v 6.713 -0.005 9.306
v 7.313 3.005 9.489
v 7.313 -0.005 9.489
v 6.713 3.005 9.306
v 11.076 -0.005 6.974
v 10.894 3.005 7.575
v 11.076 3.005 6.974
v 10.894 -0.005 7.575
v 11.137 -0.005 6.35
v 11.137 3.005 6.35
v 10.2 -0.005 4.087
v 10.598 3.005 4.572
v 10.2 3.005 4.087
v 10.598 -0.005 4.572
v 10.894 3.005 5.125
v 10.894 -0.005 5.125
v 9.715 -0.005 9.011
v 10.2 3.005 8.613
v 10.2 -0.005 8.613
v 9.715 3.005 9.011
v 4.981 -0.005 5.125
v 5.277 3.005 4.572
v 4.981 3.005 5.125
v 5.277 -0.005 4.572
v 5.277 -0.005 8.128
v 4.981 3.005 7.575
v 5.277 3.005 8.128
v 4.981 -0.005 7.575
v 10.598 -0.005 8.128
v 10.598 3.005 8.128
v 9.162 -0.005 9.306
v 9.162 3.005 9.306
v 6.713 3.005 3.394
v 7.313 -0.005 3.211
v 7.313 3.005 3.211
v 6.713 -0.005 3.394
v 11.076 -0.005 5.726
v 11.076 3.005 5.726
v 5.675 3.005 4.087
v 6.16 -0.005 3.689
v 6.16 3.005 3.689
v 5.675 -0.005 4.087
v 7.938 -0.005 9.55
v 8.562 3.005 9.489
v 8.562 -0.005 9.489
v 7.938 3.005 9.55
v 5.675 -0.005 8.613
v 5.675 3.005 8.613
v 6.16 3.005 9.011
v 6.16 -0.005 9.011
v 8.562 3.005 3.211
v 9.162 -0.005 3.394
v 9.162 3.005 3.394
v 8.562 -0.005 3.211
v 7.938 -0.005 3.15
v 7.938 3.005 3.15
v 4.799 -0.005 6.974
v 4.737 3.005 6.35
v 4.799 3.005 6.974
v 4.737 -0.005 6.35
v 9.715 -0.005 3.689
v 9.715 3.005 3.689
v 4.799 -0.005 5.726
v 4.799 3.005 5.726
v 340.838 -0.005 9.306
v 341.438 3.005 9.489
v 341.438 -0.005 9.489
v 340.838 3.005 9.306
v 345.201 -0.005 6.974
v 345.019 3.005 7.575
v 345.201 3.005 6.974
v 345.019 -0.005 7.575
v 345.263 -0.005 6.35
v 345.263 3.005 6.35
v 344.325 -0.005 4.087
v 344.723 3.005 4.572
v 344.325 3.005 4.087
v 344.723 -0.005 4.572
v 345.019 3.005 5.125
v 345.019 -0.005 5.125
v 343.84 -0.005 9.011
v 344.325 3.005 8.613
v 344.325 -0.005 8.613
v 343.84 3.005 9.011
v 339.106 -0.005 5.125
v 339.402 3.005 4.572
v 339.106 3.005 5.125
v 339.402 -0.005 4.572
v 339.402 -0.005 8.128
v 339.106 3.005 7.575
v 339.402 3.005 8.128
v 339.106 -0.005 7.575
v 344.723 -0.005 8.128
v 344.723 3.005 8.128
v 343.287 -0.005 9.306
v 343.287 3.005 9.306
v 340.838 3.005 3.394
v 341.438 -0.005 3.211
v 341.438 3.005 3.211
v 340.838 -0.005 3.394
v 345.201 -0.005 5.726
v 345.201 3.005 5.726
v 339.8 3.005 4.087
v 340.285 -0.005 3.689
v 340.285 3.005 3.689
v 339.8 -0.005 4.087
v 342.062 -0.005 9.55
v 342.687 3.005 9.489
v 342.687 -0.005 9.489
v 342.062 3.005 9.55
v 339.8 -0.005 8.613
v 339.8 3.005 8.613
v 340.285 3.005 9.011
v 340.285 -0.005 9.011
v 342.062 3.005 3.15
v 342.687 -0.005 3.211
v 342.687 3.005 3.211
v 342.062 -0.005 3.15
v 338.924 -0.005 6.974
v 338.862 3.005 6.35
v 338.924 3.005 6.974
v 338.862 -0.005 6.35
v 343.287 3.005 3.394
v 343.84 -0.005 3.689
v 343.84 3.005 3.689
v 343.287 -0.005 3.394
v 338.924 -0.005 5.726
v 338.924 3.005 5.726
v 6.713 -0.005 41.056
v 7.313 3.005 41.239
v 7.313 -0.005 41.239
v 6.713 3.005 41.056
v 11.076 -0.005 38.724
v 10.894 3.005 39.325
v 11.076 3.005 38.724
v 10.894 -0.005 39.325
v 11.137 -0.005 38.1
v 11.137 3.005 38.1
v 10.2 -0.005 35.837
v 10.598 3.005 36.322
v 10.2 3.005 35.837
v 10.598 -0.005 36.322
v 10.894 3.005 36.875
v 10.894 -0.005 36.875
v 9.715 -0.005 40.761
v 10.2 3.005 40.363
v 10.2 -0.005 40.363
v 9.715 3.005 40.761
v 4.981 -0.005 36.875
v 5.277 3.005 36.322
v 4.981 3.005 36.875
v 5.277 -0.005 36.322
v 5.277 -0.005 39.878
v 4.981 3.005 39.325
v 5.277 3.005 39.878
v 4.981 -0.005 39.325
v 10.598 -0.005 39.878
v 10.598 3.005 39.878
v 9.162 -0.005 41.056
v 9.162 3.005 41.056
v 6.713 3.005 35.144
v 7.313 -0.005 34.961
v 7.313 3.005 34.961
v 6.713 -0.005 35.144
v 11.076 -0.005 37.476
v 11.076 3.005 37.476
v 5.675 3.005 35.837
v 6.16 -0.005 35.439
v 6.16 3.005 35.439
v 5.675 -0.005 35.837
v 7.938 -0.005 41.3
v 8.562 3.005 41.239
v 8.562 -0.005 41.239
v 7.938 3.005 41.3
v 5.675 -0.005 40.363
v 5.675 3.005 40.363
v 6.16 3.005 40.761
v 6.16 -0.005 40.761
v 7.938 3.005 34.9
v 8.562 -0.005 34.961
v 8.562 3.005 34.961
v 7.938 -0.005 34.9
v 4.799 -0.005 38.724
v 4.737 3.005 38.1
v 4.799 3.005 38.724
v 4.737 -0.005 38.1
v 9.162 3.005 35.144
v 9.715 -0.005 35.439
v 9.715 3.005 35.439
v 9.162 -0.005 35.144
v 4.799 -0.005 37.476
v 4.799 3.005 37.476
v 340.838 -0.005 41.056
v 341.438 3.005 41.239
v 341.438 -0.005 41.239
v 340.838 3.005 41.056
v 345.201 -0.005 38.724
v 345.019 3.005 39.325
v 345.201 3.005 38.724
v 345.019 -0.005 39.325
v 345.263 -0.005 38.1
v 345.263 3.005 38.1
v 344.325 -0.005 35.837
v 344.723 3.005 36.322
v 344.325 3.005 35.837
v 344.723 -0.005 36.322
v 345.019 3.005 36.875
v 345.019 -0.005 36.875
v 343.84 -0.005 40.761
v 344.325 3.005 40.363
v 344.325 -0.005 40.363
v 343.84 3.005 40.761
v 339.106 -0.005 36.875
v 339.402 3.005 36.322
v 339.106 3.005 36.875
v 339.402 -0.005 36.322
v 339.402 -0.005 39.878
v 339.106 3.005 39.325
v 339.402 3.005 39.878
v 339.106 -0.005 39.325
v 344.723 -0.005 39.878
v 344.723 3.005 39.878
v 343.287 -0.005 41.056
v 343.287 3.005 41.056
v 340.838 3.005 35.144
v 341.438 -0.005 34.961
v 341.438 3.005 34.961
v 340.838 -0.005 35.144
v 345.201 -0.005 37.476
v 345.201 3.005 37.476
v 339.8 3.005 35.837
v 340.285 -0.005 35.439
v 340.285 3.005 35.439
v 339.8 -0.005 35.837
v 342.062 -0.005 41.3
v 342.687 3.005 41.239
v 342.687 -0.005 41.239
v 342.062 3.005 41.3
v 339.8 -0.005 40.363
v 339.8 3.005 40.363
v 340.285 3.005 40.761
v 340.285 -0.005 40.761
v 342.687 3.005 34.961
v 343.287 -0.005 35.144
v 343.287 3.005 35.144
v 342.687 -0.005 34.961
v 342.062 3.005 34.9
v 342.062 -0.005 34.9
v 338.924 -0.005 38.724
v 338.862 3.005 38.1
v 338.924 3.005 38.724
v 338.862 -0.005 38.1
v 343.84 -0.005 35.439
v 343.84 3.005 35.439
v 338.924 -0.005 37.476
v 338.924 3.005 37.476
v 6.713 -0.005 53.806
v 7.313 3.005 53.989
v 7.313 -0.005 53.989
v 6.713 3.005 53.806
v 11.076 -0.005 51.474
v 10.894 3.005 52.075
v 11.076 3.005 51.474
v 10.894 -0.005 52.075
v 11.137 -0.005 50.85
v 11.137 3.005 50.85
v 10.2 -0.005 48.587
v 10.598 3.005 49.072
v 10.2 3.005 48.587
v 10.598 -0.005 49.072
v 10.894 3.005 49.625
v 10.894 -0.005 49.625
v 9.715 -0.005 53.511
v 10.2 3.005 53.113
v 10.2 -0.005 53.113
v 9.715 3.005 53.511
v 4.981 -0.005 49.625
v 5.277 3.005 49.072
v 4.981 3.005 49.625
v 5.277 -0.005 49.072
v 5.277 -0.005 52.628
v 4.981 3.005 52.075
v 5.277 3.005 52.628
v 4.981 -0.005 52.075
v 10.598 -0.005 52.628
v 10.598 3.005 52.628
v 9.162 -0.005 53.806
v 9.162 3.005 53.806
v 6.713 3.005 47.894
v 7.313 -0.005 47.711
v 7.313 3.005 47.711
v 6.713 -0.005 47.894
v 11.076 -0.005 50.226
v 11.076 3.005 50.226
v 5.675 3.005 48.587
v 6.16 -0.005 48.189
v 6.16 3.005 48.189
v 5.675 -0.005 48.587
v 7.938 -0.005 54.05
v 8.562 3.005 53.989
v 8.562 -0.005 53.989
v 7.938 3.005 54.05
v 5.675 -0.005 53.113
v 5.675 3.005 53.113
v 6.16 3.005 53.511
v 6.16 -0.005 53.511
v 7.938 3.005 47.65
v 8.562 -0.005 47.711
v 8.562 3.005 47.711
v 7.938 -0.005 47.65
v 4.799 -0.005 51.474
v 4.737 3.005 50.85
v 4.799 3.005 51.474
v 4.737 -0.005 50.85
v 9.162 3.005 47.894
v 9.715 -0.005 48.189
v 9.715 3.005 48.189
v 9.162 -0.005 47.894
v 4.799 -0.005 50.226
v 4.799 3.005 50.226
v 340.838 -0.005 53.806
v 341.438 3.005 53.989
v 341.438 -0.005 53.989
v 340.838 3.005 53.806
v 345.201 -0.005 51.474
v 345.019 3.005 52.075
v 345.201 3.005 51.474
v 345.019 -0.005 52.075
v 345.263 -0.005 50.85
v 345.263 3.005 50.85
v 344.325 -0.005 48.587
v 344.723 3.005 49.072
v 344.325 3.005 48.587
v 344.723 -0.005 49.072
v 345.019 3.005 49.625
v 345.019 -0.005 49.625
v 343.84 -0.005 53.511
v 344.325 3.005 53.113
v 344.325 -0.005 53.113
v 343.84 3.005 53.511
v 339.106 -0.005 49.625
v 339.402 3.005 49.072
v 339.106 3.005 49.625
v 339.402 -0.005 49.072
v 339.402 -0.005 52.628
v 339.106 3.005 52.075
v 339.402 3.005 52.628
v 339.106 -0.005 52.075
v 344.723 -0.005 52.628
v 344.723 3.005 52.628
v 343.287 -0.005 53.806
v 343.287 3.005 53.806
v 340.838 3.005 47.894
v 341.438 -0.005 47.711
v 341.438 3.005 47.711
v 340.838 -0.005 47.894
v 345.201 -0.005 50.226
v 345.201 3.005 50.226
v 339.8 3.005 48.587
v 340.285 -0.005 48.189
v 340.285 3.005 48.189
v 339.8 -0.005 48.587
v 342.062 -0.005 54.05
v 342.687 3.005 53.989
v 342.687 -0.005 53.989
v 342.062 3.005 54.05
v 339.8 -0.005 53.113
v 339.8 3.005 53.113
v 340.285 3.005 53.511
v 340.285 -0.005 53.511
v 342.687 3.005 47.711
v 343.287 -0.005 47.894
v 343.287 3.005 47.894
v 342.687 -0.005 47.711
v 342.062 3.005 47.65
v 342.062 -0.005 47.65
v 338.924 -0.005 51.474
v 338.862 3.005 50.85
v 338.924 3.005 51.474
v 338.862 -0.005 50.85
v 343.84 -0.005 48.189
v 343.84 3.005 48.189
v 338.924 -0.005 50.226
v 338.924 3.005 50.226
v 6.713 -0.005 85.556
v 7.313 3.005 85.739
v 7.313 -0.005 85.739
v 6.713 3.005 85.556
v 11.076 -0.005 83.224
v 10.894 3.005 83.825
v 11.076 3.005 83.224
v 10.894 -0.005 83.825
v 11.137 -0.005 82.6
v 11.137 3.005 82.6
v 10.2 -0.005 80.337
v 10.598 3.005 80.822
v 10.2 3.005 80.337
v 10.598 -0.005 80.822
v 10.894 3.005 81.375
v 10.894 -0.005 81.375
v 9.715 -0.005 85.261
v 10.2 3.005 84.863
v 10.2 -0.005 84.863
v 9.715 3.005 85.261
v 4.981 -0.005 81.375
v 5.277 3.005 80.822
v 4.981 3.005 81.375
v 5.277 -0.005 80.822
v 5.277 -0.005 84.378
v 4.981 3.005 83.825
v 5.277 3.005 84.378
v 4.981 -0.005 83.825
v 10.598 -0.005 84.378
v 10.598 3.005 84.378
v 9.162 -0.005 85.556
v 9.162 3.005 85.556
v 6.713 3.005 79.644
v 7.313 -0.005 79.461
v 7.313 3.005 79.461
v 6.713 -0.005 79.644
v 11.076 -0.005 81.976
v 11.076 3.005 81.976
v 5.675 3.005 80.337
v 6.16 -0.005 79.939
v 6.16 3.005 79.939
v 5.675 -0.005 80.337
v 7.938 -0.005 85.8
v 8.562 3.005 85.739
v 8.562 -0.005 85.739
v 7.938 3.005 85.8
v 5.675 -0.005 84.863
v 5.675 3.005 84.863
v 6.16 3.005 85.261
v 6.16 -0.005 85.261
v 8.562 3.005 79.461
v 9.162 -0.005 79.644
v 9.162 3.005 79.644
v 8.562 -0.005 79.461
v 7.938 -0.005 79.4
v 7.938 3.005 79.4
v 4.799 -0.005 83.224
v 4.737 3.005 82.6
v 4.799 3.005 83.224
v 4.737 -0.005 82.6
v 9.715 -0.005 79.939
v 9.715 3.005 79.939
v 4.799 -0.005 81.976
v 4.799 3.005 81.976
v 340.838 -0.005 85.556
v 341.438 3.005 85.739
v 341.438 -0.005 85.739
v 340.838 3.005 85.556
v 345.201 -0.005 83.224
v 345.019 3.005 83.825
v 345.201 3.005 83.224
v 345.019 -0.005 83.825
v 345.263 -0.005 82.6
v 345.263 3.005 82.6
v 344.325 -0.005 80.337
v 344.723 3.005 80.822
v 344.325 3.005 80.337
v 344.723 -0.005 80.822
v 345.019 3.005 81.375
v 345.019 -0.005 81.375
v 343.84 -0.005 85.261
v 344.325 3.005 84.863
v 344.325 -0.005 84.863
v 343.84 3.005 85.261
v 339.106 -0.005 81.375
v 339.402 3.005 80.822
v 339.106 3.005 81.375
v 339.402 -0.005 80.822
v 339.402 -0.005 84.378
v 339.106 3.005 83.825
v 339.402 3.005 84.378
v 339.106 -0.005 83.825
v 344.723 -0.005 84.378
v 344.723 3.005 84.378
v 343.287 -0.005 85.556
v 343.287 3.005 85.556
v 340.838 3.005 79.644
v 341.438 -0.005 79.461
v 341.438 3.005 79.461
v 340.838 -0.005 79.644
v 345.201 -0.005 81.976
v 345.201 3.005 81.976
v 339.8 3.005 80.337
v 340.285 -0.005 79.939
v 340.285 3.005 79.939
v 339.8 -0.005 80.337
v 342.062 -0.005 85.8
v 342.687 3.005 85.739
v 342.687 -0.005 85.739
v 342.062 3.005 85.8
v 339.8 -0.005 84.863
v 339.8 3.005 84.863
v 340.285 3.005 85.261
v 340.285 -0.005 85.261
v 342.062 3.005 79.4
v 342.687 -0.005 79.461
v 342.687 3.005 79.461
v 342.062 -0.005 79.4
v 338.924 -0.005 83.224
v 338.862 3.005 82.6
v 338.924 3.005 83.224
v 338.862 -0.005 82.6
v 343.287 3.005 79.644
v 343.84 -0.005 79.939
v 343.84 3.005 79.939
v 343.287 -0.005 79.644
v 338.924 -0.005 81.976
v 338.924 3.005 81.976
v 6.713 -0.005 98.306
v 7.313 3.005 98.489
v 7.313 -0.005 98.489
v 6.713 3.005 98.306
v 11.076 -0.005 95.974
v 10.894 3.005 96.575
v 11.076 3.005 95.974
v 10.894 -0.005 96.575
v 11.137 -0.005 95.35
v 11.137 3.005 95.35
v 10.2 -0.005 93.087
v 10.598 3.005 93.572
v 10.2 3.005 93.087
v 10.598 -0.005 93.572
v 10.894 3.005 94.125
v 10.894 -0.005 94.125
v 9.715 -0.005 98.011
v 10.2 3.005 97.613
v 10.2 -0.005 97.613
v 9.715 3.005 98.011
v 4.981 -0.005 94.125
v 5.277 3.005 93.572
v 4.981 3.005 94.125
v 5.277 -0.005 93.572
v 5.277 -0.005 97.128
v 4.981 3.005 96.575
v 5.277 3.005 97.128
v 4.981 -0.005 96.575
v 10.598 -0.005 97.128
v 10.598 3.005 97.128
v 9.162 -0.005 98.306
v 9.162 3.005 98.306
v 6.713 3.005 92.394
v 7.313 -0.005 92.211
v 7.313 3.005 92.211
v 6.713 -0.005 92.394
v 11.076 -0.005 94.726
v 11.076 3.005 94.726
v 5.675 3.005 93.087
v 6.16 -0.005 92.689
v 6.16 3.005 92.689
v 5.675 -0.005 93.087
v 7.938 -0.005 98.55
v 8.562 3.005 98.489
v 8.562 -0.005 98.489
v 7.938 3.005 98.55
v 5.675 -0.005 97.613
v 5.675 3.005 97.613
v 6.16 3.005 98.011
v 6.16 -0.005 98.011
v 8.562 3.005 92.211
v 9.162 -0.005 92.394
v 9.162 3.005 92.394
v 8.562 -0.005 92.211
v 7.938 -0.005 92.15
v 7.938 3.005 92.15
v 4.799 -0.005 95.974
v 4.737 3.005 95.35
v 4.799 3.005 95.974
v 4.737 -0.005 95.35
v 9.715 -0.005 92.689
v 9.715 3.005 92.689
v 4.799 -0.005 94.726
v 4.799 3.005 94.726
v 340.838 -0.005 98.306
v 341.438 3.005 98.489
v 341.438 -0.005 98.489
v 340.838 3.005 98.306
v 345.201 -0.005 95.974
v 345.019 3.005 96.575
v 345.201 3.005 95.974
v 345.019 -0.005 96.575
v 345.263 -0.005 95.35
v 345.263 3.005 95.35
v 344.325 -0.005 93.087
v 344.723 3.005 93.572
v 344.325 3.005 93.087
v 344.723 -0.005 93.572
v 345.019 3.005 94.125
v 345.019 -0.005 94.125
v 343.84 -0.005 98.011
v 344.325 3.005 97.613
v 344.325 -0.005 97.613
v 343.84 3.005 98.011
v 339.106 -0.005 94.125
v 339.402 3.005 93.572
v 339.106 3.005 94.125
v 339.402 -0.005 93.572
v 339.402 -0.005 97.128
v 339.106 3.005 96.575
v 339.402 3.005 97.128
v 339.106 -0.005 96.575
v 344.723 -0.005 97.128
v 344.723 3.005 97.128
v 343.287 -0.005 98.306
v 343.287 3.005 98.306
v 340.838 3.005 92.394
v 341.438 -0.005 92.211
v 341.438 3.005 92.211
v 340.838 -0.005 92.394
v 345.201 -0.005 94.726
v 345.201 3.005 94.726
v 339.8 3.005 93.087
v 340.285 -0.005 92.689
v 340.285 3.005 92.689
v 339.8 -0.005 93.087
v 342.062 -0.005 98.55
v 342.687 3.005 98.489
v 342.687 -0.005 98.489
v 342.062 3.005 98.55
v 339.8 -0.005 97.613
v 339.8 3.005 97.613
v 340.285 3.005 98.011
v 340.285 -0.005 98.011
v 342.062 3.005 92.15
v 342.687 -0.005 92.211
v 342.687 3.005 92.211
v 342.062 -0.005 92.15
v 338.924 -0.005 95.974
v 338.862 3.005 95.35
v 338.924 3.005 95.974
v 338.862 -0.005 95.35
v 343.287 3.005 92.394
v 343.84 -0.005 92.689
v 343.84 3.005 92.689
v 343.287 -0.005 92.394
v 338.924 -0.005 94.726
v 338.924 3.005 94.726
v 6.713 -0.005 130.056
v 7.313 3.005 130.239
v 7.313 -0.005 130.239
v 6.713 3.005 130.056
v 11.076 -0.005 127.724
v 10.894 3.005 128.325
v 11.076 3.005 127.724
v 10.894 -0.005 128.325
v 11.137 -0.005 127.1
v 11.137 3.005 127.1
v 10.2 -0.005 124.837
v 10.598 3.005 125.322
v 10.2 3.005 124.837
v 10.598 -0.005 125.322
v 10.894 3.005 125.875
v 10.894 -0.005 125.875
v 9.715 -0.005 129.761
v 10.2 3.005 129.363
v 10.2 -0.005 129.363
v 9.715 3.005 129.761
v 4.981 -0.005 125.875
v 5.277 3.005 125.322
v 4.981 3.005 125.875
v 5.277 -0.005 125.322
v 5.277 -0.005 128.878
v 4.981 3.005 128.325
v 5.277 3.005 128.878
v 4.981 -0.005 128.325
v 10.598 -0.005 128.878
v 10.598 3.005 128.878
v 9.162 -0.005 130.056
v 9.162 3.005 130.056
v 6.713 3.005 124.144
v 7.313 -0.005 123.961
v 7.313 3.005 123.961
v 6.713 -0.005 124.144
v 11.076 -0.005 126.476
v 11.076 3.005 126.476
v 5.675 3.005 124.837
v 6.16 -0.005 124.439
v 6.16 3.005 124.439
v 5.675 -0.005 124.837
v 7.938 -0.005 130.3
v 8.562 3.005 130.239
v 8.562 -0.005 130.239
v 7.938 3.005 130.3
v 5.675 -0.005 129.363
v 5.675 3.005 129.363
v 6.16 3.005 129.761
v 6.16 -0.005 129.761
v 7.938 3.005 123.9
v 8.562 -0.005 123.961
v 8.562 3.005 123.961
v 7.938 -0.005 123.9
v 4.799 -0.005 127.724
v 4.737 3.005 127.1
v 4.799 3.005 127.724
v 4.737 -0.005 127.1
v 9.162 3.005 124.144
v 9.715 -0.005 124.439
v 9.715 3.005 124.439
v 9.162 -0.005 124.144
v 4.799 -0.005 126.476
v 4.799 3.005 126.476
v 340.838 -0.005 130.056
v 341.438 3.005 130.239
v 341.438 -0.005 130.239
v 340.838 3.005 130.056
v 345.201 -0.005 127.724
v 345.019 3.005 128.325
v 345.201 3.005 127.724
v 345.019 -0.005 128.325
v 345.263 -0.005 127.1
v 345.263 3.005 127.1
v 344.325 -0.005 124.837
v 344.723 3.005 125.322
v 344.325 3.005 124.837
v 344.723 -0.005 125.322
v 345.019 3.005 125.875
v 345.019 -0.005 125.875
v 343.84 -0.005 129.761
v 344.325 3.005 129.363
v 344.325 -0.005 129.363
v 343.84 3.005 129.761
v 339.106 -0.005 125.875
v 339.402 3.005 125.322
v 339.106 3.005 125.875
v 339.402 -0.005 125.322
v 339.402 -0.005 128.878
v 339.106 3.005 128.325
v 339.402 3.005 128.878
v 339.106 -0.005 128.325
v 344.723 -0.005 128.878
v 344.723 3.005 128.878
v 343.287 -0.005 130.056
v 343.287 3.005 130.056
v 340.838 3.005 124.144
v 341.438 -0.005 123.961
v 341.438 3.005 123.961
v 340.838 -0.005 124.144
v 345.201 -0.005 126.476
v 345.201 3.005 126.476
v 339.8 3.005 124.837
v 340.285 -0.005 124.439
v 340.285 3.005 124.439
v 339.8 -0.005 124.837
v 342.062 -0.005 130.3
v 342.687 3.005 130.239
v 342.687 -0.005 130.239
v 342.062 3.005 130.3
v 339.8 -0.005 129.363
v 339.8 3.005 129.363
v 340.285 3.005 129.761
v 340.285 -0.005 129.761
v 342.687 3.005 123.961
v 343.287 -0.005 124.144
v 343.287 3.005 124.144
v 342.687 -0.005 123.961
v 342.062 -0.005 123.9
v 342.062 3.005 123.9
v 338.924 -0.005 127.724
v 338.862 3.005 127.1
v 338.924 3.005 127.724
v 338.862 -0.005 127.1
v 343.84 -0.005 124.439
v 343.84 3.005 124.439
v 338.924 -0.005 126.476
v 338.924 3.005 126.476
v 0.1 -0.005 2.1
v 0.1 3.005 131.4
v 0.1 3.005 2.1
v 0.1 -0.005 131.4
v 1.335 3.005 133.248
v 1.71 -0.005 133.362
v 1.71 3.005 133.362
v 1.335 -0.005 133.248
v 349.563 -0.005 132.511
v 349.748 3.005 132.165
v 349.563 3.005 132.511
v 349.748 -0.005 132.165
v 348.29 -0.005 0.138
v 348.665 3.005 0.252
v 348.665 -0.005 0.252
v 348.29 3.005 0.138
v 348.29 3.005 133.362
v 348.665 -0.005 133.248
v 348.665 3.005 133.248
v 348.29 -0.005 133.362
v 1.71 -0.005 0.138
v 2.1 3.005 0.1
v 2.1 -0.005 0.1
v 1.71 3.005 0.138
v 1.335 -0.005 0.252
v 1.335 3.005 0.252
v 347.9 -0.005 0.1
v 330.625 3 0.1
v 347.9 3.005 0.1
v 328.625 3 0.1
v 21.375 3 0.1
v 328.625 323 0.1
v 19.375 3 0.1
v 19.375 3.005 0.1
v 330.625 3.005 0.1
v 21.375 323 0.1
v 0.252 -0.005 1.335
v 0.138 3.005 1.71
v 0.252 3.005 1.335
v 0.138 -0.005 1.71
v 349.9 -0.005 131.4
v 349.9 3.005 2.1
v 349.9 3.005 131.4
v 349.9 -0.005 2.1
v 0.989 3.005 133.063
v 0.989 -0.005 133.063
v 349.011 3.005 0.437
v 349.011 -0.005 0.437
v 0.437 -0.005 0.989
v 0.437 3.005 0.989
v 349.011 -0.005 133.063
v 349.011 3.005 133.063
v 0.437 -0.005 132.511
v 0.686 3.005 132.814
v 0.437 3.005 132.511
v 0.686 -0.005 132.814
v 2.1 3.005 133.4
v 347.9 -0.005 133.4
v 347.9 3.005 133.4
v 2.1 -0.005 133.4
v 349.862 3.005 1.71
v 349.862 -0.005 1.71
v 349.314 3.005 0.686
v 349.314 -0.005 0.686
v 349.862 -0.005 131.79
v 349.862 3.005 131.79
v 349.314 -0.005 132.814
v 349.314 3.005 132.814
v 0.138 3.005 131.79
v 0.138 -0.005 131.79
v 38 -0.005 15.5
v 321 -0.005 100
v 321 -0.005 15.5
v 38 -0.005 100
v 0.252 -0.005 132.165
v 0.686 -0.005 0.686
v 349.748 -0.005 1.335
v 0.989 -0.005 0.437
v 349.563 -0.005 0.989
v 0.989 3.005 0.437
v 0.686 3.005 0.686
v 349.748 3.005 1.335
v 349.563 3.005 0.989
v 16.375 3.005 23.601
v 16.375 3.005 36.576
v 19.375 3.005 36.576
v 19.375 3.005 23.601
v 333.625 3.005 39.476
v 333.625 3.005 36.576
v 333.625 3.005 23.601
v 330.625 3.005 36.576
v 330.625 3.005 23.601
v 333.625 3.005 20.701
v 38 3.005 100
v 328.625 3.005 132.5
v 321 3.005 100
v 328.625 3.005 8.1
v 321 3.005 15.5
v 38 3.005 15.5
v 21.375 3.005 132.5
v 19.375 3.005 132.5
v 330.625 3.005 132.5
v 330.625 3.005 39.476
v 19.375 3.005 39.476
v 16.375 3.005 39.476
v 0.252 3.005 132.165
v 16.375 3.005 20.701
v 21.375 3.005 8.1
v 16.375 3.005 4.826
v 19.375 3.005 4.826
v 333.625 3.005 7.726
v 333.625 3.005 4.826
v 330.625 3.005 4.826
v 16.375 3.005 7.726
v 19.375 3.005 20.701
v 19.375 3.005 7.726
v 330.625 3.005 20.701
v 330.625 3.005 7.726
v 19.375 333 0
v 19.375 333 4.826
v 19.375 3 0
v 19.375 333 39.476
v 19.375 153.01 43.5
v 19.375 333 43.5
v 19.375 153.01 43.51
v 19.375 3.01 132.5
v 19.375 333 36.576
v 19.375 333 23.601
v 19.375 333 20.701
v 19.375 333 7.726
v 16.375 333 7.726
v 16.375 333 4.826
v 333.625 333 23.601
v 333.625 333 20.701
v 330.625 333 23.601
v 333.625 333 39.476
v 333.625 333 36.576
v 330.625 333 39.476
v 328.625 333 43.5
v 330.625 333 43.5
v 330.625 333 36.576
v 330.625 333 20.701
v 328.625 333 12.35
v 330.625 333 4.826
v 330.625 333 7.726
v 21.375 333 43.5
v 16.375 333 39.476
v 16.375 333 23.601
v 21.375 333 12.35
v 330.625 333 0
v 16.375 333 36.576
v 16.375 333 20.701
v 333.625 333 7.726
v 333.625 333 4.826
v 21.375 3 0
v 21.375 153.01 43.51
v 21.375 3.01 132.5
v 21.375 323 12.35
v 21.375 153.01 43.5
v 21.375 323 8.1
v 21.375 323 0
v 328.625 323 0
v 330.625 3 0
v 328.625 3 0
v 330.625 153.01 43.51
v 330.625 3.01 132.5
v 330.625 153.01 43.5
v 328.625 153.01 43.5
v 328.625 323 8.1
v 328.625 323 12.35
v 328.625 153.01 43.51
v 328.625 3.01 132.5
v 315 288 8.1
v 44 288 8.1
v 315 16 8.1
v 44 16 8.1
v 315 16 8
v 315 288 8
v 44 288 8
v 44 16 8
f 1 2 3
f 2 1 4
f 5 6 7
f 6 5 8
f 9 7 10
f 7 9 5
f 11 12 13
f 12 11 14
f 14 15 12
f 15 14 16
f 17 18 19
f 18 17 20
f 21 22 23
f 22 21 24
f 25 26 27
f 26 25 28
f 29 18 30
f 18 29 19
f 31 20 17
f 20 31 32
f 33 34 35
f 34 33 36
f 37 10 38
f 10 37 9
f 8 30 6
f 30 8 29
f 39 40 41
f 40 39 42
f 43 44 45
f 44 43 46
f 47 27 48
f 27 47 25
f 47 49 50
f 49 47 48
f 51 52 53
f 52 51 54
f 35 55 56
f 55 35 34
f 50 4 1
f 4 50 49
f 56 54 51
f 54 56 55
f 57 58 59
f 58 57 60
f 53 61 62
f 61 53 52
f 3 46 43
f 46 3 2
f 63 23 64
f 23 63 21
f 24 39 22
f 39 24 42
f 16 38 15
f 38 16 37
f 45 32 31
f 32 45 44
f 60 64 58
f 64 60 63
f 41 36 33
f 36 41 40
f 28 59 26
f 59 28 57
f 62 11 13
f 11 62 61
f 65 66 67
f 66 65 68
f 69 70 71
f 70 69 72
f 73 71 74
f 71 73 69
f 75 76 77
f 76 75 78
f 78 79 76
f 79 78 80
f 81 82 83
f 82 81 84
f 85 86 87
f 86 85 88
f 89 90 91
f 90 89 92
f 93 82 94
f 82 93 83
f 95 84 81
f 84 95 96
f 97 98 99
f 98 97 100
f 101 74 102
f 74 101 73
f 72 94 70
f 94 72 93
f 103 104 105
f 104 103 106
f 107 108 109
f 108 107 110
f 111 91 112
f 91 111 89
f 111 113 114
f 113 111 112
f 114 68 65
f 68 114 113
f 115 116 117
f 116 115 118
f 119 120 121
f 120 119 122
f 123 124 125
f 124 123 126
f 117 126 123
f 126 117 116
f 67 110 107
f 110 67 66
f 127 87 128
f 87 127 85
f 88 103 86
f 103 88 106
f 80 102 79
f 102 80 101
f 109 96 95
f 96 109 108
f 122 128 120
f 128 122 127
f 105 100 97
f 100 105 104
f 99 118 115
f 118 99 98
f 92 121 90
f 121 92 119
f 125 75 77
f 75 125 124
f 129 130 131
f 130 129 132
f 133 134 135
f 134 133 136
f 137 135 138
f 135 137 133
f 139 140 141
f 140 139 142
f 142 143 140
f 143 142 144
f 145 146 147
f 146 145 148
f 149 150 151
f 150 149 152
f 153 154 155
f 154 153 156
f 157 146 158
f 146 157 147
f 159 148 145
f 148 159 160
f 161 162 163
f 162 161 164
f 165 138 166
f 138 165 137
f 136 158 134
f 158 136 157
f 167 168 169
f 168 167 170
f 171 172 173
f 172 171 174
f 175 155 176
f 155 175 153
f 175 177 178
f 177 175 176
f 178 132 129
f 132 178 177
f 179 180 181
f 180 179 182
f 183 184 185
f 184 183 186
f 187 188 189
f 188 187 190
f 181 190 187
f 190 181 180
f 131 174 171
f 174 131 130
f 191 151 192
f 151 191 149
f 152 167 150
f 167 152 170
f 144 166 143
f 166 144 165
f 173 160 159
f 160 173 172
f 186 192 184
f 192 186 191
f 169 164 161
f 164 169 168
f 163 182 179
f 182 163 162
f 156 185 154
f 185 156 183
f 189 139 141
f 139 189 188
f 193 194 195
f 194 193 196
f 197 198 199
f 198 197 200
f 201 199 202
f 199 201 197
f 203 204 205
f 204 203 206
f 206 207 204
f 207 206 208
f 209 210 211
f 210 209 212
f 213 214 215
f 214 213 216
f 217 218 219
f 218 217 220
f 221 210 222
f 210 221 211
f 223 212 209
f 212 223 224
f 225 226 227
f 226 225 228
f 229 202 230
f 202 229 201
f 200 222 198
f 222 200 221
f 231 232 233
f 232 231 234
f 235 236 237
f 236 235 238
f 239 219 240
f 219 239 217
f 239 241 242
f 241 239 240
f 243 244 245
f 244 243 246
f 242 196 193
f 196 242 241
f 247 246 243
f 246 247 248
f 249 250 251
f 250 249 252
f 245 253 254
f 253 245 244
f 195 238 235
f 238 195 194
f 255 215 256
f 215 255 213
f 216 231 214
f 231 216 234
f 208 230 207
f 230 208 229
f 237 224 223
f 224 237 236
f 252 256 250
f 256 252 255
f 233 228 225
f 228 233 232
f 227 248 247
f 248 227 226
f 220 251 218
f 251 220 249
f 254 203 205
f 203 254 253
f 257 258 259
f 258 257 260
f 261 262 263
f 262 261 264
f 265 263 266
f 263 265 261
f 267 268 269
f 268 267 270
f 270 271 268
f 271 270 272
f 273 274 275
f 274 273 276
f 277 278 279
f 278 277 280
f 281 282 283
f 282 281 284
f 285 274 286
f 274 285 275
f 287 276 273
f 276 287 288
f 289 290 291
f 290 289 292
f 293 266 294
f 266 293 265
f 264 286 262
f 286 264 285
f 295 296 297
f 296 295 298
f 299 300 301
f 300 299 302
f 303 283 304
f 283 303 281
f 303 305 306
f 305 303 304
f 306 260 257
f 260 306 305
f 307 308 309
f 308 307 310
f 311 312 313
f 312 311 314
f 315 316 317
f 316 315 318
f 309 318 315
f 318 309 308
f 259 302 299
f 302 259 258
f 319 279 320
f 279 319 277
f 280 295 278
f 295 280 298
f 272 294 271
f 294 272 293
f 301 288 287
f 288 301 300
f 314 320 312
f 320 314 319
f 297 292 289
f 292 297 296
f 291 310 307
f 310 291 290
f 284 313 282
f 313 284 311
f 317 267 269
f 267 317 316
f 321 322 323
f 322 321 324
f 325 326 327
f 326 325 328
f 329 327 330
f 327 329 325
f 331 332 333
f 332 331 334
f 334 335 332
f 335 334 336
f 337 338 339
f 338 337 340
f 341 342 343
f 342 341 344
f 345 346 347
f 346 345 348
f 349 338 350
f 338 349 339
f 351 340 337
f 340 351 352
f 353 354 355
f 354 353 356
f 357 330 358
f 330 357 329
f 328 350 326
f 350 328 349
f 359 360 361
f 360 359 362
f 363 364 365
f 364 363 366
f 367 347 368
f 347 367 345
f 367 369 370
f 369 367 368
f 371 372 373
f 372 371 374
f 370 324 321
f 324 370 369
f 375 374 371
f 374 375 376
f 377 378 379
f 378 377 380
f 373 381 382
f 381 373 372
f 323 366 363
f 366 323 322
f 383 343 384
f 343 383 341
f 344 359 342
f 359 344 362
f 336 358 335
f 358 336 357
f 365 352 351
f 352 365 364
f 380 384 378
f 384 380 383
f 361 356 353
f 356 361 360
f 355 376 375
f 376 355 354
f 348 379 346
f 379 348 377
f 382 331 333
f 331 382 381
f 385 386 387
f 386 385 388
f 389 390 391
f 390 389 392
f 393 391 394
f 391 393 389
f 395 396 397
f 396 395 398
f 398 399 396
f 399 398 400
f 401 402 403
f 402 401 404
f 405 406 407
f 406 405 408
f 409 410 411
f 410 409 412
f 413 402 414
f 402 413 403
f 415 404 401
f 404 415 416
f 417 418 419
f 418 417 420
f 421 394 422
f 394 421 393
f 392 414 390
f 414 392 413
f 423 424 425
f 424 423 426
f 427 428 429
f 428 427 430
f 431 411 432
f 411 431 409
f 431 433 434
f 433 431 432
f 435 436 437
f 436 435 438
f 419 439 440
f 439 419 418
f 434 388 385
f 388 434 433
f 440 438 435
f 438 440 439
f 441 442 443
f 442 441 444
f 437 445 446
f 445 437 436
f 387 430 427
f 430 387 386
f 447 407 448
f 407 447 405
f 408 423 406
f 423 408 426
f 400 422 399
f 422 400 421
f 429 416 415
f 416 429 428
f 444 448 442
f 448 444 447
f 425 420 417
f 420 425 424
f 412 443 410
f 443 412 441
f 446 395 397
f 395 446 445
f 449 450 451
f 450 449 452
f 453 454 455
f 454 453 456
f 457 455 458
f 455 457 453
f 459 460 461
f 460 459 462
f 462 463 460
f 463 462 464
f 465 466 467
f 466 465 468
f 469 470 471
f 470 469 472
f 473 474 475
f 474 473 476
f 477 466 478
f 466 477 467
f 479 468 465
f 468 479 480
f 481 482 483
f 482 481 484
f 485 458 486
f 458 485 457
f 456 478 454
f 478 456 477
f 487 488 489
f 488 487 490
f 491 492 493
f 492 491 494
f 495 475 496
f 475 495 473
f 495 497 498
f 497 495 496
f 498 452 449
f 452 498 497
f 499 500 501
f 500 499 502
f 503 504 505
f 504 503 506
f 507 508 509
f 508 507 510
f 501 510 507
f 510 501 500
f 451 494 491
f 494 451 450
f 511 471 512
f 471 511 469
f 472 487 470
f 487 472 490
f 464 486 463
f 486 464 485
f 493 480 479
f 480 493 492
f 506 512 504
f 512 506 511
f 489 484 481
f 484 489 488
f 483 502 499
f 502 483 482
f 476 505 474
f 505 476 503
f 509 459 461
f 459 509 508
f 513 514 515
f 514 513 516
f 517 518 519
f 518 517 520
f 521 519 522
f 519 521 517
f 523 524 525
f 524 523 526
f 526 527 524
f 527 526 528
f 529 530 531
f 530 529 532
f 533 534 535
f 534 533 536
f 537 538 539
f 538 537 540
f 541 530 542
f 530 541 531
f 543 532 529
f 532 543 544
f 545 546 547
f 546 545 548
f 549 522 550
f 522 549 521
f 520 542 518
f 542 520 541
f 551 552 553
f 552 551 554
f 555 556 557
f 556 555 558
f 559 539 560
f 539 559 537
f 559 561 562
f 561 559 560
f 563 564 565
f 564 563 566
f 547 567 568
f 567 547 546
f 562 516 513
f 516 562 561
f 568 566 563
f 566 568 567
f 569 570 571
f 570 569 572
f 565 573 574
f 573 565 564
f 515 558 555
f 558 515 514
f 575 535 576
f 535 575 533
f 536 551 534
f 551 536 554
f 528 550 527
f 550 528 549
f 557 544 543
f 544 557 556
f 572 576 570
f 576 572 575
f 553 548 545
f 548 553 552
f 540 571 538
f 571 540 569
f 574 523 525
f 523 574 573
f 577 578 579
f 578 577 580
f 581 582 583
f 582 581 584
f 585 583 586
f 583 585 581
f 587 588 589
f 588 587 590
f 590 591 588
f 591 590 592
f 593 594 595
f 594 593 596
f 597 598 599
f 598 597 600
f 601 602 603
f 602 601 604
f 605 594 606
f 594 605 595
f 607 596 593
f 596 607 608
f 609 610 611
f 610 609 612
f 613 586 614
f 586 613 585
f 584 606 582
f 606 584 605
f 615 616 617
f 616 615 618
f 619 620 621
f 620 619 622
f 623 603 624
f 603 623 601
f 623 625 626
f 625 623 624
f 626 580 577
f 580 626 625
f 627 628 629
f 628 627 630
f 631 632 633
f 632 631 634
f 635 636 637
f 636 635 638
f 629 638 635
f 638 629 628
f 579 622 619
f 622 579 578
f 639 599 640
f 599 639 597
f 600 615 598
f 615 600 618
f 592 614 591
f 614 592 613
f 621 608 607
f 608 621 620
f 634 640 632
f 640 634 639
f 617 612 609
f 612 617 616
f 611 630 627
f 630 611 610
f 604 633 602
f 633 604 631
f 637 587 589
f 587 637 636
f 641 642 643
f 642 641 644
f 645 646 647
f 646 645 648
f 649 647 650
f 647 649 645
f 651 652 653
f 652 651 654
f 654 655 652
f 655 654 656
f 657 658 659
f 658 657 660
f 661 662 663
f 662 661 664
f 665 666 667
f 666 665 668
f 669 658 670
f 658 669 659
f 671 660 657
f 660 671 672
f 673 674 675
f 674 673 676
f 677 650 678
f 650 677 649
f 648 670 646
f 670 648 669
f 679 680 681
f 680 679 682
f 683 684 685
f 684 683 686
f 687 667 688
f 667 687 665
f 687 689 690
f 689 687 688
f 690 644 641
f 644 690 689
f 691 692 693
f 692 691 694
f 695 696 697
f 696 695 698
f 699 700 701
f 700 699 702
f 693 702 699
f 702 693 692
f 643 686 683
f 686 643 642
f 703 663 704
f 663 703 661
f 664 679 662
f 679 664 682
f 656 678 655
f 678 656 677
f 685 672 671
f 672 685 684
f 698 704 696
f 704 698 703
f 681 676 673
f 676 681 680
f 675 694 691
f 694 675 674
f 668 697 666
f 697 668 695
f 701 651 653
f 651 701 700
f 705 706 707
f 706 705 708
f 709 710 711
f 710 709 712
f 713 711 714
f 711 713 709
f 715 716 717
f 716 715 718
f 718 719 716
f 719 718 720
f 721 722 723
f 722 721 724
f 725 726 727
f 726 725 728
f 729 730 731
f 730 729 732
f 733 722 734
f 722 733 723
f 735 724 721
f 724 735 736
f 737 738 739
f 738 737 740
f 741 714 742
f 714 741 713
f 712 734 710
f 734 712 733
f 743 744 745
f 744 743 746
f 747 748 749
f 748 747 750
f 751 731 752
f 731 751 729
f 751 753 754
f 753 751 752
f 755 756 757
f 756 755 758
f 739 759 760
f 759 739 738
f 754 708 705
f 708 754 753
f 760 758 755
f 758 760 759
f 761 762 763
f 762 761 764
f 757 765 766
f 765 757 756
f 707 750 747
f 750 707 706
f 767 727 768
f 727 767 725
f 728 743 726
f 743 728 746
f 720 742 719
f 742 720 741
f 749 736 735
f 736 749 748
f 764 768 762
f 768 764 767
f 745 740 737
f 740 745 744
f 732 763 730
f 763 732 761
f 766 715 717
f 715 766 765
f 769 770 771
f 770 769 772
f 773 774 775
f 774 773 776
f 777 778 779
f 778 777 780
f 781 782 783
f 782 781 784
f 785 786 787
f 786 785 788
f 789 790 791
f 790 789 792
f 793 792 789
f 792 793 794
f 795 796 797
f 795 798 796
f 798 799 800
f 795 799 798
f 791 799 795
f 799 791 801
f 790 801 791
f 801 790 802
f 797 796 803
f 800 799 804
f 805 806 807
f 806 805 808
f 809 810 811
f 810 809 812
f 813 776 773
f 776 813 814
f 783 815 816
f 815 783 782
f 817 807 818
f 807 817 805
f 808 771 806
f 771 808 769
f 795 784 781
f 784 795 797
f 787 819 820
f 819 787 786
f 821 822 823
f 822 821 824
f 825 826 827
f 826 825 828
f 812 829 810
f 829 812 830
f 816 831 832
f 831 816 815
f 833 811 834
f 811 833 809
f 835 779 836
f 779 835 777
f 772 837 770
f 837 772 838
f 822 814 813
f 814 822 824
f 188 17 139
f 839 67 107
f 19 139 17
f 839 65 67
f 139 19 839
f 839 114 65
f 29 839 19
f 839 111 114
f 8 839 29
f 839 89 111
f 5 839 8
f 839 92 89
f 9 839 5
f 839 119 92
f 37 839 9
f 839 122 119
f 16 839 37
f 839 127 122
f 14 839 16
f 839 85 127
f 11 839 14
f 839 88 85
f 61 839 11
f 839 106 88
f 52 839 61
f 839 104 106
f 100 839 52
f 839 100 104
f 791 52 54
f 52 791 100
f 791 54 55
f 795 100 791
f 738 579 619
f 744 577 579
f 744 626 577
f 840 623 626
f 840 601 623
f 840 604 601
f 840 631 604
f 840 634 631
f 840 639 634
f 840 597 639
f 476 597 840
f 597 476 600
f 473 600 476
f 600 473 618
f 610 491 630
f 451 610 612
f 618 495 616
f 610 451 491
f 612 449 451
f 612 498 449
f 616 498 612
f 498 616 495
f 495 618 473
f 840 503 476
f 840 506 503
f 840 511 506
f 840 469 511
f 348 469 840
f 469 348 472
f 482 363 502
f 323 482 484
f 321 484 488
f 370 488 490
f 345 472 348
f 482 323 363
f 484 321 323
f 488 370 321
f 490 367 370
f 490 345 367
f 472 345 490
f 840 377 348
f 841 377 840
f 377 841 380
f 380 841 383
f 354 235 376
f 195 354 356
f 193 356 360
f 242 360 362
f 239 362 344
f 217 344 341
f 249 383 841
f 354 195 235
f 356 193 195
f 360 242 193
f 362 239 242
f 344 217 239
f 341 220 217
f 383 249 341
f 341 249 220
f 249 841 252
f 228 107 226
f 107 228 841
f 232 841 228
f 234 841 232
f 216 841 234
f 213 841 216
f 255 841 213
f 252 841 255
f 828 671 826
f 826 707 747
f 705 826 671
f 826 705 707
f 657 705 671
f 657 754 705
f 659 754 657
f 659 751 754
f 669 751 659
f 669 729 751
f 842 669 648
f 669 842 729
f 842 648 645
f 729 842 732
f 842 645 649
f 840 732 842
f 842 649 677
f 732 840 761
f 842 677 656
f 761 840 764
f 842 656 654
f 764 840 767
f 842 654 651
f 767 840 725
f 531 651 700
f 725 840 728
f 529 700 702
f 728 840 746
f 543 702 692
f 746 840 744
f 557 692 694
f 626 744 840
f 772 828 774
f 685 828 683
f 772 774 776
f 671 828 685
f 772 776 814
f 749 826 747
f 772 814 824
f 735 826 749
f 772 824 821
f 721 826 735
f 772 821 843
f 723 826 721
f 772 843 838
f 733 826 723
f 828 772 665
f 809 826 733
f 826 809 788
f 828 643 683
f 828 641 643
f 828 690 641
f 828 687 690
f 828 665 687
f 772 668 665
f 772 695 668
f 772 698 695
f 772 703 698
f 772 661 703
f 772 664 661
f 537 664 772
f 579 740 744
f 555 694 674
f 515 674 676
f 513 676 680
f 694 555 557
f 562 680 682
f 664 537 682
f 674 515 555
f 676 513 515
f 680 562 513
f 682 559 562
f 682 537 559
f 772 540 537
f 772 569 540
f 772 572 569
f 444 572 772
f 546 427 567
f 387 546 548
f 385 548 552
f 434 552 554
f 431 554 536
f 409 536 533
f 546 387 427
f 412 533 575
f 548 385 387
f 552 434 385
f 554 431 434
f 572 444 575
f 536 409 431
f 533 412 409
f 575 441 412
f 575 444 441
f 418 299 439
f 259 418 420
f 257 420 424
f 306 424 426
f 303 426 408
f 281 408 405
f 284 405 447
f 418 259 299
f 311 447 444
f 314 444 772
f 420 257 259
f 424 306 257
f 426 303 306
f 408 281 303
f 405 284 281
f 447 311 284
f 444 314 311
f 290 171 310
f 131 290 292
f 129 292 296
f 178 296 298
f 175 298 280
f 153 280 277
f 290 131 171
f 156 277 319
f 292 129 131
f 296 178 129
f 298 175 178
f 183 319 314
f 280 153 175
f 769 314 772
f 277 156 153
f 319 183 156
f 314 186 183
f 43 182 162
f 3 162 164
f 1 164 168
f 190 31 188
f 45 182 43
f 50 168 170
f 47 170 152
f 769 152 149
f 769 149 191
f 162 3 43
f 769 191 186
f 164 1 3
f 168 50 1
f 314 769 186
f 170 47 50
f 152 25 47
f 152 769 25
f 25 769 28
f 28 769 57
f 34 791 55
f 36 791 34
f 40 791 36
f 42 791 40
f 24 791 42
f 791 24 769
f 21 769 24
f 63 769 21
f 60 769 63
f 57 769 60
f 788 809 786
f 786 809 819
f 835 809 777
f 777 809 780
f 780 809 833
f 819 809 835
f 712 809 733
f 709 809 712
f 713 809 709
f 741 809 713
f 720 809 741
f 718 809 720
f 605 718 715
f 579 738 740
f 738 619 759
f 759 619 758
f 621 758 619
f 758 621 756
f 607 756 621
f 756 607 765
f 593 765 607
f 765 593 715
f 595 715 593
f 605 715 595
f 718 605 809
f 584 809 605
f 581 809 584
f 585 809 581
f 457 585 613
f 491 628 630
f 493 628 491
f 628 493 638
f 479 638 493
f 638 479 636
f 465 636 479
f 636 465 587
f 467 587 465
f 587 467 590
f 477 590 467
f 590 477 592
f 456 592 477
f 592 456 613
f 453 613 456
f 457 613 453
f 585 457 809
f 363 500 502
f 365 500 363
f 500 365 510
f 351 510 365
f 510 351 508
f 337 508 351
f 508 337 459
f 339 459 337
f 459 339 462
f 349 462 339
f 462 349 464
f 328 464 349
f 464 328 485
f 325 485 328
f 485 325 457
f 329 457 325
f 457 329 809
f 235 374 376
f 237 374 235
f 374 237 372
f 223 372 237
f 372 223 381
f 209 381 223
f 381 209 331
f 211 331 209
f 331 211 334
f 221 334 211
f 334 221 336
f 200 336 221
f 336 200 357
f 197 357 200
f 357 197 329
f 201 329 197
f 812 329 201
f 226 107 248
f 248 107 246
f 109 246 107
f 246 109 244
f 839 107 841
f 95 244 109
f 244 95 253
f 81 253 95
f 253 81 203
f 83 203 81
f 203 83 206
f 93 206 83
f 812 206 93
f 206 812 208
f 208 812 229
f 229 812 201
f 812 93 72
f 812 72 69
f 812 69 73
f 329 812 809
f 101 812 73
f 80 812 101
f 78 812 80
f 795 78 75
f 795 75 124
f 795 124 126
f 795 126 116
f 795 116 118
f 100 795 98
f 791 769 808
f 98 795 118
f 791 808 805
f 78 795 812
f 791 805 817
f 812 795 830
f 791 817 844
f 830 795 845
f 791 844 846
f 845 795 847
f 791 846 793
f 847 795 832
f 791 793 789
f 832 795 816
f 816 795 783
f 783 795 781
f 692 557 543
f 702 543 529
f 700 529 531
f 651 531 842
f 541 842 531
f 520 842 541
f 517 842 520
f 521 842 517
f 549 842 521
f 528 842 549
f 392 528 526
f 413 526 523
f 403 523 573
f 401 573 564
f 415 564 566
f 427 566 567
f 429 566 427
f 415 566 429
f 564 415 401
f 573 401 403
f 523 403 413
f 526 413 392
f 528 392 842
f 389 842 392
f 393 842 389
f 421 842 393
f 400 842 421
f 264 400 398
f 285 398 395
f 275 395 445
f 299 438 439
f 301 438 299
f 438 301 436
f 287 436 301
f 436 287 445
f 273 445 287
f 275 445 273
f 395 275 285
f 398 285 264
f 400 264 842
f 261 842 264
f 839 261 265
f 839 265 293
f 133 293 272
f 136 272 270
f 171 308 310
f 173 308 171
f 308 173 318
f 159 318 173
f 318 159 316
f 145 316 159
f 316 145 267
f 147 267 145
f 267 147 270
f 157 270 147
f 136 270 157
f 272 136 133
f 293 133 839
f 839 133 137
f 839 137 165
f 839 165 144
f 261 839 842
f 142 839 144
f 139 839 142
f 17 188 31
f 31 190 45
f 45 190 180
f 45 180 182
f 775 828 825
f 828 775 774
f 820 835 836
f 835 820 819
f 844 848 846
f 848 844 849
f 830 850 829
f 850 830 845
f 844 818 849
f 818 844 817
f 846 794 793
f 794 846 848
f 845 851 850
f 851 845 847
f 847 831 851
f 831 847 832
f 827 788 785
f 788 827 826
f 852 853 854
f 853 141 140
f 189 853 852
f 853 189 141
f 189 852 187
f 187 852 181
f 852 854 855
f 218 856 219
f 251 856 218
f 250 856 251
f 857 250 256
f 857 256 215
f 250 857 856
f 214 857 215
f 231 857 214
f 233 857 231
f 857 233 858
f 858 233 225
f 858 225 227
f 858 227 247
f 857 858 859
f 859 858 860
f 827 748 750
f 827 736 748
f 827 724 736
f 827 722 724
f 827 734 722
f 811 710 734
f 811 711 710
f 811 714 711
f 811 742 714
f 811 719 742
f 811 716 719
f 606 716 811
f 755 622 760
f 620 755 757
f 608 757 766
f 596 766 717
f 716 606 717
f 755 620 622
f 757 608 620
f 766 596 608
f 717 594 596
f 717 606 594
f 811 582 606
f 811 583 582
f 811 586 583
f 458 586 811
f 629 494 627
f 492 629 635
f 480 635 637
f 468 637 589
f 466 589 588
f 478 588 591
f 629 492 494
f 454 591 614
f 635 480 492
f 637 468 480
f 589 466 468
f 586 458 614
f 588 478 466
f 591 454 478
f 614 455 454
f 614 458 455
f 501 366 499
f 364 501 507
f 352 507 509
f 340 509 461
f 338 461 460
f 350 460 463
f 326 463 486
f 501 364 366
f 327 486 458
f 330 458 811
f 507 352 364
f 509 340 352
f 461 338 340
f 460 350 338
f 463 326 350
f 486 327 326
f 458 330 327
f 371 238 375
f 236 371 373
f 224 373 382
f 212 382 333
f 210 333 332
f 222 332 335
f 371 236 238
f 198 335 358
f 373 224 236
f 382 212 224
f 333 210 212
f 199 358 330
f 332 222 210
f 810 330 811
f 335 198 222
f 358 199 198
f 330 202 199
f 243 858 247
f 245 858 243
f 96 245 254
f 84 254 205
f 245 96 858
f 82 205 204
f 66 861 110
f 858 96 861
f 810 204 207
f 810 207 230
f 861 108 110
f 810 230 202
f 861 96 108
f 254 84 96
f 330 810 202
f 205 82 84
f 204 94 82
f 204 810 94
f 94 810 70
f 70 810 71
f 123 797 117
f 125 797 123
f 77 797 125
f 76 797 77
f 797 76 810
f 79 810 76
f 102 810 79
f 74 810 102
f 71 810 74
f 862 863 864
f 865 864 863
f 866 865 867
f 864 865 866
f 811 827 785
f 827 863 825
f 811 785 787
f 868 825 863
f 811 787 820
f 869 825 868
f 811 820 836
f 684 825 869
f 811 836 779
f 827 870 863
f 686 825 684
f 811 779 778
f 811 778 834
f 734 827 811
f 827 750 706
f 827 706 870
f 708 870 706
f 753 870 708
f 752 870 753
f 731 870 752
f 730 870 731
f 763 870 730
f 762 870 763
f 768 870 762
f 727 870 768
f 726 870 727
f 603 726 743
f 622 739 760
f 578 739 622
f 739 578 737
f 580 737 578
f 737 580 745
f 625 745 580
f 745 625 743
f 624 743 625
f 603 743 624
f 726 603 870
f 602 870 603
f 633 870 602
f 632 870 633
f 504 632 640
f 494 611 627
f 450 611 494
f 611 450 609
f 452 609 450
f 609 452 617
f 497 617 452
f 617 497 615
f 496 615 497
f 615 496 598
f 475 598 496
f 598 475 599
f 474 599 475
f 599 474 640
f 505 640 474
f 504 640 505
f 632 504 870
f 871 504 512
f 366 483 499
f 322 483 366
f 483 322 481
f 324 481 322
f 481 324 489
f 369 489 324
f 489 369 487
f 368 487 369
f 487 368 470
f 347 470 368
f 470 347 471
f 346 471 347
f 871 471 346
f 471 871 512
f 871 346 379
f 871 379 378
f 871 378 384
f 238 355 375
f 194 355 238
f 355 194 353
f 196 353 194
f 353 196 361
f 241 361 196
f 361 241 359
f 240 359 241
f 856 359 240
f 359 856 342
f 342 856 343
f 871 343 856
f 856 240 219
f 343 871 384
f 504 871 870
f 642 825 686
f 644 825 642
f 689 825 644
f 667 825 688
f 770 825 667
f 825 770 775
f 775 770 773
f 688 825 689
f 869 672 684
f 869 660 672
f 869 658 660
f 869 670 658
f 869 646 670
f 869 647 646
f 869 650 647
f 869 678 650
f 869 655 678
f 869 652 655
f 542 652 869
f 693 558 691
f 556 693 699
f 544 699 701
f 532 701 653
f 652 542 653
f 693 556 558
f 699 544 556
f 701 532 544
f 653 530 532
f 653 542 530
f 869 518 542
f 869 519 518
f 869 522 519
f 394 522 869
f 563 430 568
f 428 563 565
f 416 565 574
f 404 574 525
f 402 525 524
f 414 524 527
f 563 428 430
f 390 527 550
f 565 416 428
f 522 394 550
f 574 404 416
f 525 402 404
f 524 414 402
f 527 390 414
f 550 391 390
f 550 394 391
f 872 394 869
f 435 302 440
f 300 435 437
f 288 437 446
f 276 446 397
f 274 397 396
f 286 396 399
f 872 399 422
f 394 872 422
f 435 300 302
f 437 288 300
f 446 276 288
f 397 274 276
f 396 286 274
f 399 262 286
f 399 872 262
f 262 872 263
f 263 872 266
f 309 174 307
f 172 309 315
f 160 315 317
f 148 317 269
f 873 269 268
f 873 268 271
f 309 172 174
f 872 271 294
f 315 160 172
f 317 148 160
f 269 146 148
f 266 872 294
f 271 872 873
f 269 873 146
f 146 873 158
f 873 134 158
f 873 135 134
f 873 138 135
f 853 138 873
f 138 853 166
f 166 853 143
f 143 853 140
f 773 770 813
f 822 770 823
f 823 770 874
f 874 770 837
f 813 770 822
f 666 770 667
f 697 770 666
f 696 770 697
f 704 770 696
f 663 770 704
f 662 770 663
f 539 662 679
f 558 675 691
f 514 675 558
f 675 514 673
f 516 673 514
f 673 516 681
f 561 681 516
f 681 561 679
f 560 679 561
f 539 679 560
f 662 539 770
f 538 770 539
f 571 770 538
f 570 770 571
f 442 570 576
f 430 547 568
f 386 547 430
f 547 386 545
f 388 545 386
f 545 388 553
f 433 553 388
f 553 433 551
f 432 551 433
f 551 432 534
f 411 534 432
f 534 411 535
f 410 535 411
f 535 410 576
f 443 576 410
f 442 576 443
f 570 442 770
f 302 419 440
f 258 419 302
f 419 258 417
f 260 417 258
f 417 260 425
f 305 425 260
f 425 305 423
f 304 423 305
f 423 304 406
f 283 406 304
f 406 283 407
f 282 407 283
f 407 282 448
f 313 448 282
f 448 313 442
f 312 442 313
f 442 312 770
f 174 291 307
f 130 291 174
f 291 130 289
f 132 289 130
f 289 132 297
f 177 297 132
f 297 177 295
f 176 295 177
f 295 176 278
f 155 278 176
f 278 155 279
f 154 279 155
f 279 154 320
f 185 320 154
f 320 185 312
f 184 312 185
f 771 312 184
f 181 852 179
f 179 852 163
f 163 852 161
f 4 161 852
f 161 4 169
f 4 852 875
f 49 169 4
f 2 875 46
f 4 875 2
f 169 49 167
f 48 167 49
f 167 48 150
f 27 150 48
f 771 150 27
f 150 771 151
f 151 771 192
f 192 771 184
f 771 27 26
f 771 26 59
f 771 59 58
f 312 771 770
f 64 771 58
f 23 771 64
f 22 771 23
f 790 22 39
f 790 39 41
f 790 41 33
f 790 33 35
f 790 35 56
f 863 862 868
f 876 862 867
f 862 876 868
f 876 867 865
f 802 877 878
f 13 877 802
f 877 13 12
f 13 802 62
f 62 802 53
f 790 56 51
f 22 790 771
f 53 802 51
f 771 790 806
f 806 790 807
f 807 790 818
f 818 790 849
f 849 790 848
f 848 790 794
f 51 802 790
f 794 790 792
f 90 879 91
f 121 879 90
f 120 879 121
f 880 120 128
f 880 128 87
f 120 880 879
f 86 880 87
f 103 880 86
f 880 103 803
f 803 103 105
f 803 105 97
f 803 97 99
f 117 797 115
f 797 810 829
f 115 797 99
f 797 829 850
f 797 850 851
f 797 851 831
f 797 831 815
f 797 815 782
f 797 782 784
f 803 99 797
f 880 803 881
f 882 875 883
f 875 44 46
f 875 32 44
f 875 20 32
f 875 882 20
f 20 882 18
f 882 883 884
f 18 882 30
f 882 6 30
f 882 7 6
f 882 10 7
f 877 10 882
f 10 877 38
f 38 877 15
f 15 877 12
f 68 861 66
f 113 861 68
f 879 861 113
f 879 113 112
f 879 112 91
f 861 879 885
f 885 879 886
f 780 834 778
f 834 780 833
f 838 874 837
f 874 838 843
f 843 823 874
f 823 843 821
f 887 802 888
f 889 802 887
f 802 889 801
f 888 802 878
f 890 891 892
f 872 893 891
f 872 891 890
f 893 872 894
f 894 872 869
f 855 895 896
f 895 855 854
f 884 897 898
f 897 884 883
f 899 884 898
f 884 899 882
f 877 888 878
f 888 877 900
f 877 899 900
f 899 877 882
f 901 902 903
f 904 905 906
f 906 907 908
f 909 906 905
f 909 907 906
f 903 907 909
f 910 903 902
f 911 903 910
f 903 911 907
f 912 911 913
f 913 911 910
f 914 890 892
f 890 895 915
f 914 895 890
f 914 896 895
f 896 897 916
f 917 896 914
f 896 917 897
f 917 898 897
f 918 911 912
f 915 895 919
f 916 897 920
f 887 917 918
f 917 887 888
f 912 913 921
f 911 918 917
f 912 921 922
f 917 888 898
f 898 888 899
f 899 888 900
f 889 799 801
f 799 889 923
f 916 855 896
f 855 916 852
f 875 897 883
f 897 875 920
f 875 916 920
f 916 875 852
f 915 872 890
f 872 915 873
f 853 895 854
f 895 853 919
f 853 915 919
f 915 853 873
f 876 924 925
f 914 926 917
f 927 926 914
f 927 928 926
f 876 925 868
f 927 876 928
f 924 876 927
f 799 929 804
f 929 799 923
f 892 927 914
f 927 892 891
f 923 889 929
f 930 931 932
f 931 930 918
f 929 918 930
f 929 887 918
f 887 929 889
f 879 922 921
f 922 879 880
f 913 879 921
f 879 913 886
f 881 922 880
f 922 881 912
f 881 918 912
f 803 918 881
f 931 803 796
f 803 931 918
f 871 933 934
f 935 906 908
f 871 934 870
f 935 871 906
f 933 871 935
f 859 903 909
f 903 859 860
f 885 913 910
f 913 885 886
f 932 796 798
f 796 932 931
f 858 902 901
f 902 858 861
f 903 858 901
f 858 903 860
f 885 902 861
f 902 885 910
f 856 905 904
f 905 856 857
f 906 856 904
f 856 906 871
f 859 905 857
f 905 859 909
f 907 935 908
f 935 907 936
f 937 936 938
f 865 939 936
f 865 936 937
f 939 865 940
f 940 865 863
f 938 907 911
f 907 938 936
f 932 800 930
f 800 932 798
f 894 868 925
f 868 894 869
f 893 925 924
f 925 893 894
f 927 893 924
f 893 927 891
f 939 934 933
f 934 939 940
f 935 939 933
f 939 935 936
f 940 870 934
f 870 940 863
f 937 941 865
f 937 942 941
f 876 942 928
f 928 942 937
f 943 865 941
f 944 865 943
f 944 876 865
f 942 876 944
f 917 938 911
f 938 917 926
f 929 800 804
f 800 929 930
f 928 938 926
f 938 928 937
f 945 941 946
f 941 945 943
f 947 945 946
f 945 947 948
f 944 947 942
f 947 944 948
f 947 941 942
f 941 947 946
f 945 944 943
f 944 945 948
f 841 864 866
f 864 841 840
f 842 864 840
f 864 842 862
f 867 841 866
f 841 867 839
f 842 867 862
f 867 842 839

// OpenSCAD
// Dell Optiplex 3080 case and tray.
//
//
// it was while creating this, i discovered the dell will not, in fact, fit in a 330 rack tray.


/*
// next 2 lines used only by my 'on save' script. can be ignored otherwise.
// AUTO-V
version = "v0.1-2026/05/15r38";
*/

include <blank variable tray.scad>;

dell_width = 291.0;
dell_feet_height = 3.5;
dell_height = 96.0 - dell_feet_height; //the height of the case minus the feet, as the tray will sit on the feet. this is important for the cutout height.
dell_depth = 292.0;
dell_rim = 4.0; //the solid rim around the front of hte case
//create a basic inner & lower box to represent the feet
dell_feet_width = dell_width - 20;
dell_feet_depth = dell_depth - 20;


module dell_optiplex_3080(posx = 0, posy = 0, posz = 0) {
    //just a basic box representing the case dimensions
    translate([posx + 10, posy + 10, posz + 0]) {
        color("black") {
            cube([dell_feet_width, dell_feet_depth, dell_feet_height]);
        }
    }
    translate([posx, posy, posz + dell_feet_height]) {
        color("gray"){
            cube([dell_width, dell_depth, dell_height]);
        }
    }

    //add a rim around the front of the case, have it extend out the front so it can be differenced out of the tray panel
    translate([posx + dell_rim, posy-100, posz+dell_feet_height+dell_rim]) {
        color("red") {
            cube([dell_width - (2 * dell_rim), 
                100, 
                dell_height-(2 * dell_rim)]);
        }
    }

}

/**

module blank_variable_tray(
    panel_u_size            = 1, // front panel height in U
    tray_u_size             = undef, // side/base height in U. if undef, defaults to panel_u_size. if 0.6 is used, you can get 2 slides per side, 0.5 would only make the sides high enough for 1 slide
    tray_depth_scale        = 1, // 0 to 1, fraction of rack_width. 1 = full rack_width depth (330mm), 0.5 = rack_width/2 depth (165mm), etc.
    holes                   = 2, // mounting holes PER SIDE (2, 3, 4, or 6). I need to revisit this, as '2' would put 4 holes in each side of a 2U panel, but you might only want 2 each side (top/bottom)
    import_file             = "", //used for importing an SVG or STL/3MF onto the front panel face, see variable_front_panel_face_import() parameters below.
    import_type             = "none", //"svg", "stl", or "none"
    import_width            = 0, //if 0, defaults to 50% of the front panel inner width. used for imported SVGs and STLs/3MFs.
    import_height           = 0, //if 0, defaults to 50% of the front panel inner height. used for imported SVGs and STLs/3MFs.
    import_depth            = 0.8, //how far the imported design is embossed (positive) or engraved (negative). if 0, defaults to 0.8mm for SVGs, and 50% of the target width for STLs/3MFs.
    import_offset_x         = 0, //X offset for imported design from exact center of front panel. positive values move right, negative values move left.
    import_offset_z         = 0, //Z offset for imported design from exact center of front panel. positive values move up, negative values move down.
    import_mode             = "emboss", // "emboss" (raised from front face) or "engrave" (cut into front face)
    side_support            = 1, //0 or 1 to add gussets between front panel and sides when panel is taller than sides
    side_support_back       = 40, //how far back the gussets extend (mm)
    side_support_thickness  = 2.0, //normally the same as tray_side_thickness, but can be different if you want thinner gussets
    tray_side_thickness     = 2.0, //thickness of the tray side walls in mm.
    front_panel_thickness   = 3.0, //consider your screw lengths. 3mm is usually fine for m6x16 screws.
    back_panel              = 0, //0 or 1 to add a rear wall to make a drawer. rear wall height controlled by back_panel_height (in U).
    back_panel_thickness    = 2.0, //the rear wall thickness, if you have back_panel=1.
    back_panel_height       = 1.0, //in U units, converted to mm internally
    tray_thickness          = 5.0, //thickness of the tray base in mm.
    rack_width              = 330, //this is the external width of the rack, if single-width, using this and post_width is what determines the panel and tray widths and depths.
    post_width              = 15.875, //a normal single-width rack. If using double-width and/or sliders, this will be wider, but calculated automatically based on this.
    hole_d                  = 6.4, //holes sized for m6 screws, but slightly oversized for clearance.
    u_height                = 44.5, //standard U height in mm.
    hole_offset_z           = 12.7, //initial hole offset from the bottom panel/rack post in mm.
    hole_spacing            = 15.875, //spacing between holes in mm, standard U spacing.
    front_panel_undersizing = 0.1, //mm the front panel is undersized by on each edge to ensure it doesn't interfere with other panels
    front_panel_edge_radius = 2.0, //mm radius for front panel edges. set to 0 for sharp edges.
    tray_post_clearance     = 0.5, //0.5mm clearance, this makes 1mm total tray clearance. adjust as needed. modifying this might require tweaking the post_slide_cutout and hole_clearance to ensure the holes still clear properly.
    post_slide_width        = 3.0, //*these next 3 are for the slides that go into the posts on the rack.
    post_slide_cutout       = 3.2, //*ideally you should create a 1U post for testing the fit of these before printing everything.
    hole_clearance          = 0.3  //*you would be better off adjusting the post dimensions, rather than changing the tray dimensions, and create posts to fit the trays. making the side slides smaller to fit would make them weaker. So make the post cutouts bigger instead.
) {

**/


module dell_tray() {
    blank_variable_tray(rack_width = 350, rack_depth = 330, panel_u_size = 3, tray_u_size = 1, tray_depth_scale = 1.0, holes = 4, back_panel = 1, back_panel_height = 0.3, back_panel_thickness = 10.0, side_support = 1, side_support_back = 150, tray_thickness = 8);
}

difference() {
    dell_tray();
    //offset slightly to the right due to side feet on the case
    dell_optiplex_3080(posx = 34, posy = 6, posz = 8);
}
